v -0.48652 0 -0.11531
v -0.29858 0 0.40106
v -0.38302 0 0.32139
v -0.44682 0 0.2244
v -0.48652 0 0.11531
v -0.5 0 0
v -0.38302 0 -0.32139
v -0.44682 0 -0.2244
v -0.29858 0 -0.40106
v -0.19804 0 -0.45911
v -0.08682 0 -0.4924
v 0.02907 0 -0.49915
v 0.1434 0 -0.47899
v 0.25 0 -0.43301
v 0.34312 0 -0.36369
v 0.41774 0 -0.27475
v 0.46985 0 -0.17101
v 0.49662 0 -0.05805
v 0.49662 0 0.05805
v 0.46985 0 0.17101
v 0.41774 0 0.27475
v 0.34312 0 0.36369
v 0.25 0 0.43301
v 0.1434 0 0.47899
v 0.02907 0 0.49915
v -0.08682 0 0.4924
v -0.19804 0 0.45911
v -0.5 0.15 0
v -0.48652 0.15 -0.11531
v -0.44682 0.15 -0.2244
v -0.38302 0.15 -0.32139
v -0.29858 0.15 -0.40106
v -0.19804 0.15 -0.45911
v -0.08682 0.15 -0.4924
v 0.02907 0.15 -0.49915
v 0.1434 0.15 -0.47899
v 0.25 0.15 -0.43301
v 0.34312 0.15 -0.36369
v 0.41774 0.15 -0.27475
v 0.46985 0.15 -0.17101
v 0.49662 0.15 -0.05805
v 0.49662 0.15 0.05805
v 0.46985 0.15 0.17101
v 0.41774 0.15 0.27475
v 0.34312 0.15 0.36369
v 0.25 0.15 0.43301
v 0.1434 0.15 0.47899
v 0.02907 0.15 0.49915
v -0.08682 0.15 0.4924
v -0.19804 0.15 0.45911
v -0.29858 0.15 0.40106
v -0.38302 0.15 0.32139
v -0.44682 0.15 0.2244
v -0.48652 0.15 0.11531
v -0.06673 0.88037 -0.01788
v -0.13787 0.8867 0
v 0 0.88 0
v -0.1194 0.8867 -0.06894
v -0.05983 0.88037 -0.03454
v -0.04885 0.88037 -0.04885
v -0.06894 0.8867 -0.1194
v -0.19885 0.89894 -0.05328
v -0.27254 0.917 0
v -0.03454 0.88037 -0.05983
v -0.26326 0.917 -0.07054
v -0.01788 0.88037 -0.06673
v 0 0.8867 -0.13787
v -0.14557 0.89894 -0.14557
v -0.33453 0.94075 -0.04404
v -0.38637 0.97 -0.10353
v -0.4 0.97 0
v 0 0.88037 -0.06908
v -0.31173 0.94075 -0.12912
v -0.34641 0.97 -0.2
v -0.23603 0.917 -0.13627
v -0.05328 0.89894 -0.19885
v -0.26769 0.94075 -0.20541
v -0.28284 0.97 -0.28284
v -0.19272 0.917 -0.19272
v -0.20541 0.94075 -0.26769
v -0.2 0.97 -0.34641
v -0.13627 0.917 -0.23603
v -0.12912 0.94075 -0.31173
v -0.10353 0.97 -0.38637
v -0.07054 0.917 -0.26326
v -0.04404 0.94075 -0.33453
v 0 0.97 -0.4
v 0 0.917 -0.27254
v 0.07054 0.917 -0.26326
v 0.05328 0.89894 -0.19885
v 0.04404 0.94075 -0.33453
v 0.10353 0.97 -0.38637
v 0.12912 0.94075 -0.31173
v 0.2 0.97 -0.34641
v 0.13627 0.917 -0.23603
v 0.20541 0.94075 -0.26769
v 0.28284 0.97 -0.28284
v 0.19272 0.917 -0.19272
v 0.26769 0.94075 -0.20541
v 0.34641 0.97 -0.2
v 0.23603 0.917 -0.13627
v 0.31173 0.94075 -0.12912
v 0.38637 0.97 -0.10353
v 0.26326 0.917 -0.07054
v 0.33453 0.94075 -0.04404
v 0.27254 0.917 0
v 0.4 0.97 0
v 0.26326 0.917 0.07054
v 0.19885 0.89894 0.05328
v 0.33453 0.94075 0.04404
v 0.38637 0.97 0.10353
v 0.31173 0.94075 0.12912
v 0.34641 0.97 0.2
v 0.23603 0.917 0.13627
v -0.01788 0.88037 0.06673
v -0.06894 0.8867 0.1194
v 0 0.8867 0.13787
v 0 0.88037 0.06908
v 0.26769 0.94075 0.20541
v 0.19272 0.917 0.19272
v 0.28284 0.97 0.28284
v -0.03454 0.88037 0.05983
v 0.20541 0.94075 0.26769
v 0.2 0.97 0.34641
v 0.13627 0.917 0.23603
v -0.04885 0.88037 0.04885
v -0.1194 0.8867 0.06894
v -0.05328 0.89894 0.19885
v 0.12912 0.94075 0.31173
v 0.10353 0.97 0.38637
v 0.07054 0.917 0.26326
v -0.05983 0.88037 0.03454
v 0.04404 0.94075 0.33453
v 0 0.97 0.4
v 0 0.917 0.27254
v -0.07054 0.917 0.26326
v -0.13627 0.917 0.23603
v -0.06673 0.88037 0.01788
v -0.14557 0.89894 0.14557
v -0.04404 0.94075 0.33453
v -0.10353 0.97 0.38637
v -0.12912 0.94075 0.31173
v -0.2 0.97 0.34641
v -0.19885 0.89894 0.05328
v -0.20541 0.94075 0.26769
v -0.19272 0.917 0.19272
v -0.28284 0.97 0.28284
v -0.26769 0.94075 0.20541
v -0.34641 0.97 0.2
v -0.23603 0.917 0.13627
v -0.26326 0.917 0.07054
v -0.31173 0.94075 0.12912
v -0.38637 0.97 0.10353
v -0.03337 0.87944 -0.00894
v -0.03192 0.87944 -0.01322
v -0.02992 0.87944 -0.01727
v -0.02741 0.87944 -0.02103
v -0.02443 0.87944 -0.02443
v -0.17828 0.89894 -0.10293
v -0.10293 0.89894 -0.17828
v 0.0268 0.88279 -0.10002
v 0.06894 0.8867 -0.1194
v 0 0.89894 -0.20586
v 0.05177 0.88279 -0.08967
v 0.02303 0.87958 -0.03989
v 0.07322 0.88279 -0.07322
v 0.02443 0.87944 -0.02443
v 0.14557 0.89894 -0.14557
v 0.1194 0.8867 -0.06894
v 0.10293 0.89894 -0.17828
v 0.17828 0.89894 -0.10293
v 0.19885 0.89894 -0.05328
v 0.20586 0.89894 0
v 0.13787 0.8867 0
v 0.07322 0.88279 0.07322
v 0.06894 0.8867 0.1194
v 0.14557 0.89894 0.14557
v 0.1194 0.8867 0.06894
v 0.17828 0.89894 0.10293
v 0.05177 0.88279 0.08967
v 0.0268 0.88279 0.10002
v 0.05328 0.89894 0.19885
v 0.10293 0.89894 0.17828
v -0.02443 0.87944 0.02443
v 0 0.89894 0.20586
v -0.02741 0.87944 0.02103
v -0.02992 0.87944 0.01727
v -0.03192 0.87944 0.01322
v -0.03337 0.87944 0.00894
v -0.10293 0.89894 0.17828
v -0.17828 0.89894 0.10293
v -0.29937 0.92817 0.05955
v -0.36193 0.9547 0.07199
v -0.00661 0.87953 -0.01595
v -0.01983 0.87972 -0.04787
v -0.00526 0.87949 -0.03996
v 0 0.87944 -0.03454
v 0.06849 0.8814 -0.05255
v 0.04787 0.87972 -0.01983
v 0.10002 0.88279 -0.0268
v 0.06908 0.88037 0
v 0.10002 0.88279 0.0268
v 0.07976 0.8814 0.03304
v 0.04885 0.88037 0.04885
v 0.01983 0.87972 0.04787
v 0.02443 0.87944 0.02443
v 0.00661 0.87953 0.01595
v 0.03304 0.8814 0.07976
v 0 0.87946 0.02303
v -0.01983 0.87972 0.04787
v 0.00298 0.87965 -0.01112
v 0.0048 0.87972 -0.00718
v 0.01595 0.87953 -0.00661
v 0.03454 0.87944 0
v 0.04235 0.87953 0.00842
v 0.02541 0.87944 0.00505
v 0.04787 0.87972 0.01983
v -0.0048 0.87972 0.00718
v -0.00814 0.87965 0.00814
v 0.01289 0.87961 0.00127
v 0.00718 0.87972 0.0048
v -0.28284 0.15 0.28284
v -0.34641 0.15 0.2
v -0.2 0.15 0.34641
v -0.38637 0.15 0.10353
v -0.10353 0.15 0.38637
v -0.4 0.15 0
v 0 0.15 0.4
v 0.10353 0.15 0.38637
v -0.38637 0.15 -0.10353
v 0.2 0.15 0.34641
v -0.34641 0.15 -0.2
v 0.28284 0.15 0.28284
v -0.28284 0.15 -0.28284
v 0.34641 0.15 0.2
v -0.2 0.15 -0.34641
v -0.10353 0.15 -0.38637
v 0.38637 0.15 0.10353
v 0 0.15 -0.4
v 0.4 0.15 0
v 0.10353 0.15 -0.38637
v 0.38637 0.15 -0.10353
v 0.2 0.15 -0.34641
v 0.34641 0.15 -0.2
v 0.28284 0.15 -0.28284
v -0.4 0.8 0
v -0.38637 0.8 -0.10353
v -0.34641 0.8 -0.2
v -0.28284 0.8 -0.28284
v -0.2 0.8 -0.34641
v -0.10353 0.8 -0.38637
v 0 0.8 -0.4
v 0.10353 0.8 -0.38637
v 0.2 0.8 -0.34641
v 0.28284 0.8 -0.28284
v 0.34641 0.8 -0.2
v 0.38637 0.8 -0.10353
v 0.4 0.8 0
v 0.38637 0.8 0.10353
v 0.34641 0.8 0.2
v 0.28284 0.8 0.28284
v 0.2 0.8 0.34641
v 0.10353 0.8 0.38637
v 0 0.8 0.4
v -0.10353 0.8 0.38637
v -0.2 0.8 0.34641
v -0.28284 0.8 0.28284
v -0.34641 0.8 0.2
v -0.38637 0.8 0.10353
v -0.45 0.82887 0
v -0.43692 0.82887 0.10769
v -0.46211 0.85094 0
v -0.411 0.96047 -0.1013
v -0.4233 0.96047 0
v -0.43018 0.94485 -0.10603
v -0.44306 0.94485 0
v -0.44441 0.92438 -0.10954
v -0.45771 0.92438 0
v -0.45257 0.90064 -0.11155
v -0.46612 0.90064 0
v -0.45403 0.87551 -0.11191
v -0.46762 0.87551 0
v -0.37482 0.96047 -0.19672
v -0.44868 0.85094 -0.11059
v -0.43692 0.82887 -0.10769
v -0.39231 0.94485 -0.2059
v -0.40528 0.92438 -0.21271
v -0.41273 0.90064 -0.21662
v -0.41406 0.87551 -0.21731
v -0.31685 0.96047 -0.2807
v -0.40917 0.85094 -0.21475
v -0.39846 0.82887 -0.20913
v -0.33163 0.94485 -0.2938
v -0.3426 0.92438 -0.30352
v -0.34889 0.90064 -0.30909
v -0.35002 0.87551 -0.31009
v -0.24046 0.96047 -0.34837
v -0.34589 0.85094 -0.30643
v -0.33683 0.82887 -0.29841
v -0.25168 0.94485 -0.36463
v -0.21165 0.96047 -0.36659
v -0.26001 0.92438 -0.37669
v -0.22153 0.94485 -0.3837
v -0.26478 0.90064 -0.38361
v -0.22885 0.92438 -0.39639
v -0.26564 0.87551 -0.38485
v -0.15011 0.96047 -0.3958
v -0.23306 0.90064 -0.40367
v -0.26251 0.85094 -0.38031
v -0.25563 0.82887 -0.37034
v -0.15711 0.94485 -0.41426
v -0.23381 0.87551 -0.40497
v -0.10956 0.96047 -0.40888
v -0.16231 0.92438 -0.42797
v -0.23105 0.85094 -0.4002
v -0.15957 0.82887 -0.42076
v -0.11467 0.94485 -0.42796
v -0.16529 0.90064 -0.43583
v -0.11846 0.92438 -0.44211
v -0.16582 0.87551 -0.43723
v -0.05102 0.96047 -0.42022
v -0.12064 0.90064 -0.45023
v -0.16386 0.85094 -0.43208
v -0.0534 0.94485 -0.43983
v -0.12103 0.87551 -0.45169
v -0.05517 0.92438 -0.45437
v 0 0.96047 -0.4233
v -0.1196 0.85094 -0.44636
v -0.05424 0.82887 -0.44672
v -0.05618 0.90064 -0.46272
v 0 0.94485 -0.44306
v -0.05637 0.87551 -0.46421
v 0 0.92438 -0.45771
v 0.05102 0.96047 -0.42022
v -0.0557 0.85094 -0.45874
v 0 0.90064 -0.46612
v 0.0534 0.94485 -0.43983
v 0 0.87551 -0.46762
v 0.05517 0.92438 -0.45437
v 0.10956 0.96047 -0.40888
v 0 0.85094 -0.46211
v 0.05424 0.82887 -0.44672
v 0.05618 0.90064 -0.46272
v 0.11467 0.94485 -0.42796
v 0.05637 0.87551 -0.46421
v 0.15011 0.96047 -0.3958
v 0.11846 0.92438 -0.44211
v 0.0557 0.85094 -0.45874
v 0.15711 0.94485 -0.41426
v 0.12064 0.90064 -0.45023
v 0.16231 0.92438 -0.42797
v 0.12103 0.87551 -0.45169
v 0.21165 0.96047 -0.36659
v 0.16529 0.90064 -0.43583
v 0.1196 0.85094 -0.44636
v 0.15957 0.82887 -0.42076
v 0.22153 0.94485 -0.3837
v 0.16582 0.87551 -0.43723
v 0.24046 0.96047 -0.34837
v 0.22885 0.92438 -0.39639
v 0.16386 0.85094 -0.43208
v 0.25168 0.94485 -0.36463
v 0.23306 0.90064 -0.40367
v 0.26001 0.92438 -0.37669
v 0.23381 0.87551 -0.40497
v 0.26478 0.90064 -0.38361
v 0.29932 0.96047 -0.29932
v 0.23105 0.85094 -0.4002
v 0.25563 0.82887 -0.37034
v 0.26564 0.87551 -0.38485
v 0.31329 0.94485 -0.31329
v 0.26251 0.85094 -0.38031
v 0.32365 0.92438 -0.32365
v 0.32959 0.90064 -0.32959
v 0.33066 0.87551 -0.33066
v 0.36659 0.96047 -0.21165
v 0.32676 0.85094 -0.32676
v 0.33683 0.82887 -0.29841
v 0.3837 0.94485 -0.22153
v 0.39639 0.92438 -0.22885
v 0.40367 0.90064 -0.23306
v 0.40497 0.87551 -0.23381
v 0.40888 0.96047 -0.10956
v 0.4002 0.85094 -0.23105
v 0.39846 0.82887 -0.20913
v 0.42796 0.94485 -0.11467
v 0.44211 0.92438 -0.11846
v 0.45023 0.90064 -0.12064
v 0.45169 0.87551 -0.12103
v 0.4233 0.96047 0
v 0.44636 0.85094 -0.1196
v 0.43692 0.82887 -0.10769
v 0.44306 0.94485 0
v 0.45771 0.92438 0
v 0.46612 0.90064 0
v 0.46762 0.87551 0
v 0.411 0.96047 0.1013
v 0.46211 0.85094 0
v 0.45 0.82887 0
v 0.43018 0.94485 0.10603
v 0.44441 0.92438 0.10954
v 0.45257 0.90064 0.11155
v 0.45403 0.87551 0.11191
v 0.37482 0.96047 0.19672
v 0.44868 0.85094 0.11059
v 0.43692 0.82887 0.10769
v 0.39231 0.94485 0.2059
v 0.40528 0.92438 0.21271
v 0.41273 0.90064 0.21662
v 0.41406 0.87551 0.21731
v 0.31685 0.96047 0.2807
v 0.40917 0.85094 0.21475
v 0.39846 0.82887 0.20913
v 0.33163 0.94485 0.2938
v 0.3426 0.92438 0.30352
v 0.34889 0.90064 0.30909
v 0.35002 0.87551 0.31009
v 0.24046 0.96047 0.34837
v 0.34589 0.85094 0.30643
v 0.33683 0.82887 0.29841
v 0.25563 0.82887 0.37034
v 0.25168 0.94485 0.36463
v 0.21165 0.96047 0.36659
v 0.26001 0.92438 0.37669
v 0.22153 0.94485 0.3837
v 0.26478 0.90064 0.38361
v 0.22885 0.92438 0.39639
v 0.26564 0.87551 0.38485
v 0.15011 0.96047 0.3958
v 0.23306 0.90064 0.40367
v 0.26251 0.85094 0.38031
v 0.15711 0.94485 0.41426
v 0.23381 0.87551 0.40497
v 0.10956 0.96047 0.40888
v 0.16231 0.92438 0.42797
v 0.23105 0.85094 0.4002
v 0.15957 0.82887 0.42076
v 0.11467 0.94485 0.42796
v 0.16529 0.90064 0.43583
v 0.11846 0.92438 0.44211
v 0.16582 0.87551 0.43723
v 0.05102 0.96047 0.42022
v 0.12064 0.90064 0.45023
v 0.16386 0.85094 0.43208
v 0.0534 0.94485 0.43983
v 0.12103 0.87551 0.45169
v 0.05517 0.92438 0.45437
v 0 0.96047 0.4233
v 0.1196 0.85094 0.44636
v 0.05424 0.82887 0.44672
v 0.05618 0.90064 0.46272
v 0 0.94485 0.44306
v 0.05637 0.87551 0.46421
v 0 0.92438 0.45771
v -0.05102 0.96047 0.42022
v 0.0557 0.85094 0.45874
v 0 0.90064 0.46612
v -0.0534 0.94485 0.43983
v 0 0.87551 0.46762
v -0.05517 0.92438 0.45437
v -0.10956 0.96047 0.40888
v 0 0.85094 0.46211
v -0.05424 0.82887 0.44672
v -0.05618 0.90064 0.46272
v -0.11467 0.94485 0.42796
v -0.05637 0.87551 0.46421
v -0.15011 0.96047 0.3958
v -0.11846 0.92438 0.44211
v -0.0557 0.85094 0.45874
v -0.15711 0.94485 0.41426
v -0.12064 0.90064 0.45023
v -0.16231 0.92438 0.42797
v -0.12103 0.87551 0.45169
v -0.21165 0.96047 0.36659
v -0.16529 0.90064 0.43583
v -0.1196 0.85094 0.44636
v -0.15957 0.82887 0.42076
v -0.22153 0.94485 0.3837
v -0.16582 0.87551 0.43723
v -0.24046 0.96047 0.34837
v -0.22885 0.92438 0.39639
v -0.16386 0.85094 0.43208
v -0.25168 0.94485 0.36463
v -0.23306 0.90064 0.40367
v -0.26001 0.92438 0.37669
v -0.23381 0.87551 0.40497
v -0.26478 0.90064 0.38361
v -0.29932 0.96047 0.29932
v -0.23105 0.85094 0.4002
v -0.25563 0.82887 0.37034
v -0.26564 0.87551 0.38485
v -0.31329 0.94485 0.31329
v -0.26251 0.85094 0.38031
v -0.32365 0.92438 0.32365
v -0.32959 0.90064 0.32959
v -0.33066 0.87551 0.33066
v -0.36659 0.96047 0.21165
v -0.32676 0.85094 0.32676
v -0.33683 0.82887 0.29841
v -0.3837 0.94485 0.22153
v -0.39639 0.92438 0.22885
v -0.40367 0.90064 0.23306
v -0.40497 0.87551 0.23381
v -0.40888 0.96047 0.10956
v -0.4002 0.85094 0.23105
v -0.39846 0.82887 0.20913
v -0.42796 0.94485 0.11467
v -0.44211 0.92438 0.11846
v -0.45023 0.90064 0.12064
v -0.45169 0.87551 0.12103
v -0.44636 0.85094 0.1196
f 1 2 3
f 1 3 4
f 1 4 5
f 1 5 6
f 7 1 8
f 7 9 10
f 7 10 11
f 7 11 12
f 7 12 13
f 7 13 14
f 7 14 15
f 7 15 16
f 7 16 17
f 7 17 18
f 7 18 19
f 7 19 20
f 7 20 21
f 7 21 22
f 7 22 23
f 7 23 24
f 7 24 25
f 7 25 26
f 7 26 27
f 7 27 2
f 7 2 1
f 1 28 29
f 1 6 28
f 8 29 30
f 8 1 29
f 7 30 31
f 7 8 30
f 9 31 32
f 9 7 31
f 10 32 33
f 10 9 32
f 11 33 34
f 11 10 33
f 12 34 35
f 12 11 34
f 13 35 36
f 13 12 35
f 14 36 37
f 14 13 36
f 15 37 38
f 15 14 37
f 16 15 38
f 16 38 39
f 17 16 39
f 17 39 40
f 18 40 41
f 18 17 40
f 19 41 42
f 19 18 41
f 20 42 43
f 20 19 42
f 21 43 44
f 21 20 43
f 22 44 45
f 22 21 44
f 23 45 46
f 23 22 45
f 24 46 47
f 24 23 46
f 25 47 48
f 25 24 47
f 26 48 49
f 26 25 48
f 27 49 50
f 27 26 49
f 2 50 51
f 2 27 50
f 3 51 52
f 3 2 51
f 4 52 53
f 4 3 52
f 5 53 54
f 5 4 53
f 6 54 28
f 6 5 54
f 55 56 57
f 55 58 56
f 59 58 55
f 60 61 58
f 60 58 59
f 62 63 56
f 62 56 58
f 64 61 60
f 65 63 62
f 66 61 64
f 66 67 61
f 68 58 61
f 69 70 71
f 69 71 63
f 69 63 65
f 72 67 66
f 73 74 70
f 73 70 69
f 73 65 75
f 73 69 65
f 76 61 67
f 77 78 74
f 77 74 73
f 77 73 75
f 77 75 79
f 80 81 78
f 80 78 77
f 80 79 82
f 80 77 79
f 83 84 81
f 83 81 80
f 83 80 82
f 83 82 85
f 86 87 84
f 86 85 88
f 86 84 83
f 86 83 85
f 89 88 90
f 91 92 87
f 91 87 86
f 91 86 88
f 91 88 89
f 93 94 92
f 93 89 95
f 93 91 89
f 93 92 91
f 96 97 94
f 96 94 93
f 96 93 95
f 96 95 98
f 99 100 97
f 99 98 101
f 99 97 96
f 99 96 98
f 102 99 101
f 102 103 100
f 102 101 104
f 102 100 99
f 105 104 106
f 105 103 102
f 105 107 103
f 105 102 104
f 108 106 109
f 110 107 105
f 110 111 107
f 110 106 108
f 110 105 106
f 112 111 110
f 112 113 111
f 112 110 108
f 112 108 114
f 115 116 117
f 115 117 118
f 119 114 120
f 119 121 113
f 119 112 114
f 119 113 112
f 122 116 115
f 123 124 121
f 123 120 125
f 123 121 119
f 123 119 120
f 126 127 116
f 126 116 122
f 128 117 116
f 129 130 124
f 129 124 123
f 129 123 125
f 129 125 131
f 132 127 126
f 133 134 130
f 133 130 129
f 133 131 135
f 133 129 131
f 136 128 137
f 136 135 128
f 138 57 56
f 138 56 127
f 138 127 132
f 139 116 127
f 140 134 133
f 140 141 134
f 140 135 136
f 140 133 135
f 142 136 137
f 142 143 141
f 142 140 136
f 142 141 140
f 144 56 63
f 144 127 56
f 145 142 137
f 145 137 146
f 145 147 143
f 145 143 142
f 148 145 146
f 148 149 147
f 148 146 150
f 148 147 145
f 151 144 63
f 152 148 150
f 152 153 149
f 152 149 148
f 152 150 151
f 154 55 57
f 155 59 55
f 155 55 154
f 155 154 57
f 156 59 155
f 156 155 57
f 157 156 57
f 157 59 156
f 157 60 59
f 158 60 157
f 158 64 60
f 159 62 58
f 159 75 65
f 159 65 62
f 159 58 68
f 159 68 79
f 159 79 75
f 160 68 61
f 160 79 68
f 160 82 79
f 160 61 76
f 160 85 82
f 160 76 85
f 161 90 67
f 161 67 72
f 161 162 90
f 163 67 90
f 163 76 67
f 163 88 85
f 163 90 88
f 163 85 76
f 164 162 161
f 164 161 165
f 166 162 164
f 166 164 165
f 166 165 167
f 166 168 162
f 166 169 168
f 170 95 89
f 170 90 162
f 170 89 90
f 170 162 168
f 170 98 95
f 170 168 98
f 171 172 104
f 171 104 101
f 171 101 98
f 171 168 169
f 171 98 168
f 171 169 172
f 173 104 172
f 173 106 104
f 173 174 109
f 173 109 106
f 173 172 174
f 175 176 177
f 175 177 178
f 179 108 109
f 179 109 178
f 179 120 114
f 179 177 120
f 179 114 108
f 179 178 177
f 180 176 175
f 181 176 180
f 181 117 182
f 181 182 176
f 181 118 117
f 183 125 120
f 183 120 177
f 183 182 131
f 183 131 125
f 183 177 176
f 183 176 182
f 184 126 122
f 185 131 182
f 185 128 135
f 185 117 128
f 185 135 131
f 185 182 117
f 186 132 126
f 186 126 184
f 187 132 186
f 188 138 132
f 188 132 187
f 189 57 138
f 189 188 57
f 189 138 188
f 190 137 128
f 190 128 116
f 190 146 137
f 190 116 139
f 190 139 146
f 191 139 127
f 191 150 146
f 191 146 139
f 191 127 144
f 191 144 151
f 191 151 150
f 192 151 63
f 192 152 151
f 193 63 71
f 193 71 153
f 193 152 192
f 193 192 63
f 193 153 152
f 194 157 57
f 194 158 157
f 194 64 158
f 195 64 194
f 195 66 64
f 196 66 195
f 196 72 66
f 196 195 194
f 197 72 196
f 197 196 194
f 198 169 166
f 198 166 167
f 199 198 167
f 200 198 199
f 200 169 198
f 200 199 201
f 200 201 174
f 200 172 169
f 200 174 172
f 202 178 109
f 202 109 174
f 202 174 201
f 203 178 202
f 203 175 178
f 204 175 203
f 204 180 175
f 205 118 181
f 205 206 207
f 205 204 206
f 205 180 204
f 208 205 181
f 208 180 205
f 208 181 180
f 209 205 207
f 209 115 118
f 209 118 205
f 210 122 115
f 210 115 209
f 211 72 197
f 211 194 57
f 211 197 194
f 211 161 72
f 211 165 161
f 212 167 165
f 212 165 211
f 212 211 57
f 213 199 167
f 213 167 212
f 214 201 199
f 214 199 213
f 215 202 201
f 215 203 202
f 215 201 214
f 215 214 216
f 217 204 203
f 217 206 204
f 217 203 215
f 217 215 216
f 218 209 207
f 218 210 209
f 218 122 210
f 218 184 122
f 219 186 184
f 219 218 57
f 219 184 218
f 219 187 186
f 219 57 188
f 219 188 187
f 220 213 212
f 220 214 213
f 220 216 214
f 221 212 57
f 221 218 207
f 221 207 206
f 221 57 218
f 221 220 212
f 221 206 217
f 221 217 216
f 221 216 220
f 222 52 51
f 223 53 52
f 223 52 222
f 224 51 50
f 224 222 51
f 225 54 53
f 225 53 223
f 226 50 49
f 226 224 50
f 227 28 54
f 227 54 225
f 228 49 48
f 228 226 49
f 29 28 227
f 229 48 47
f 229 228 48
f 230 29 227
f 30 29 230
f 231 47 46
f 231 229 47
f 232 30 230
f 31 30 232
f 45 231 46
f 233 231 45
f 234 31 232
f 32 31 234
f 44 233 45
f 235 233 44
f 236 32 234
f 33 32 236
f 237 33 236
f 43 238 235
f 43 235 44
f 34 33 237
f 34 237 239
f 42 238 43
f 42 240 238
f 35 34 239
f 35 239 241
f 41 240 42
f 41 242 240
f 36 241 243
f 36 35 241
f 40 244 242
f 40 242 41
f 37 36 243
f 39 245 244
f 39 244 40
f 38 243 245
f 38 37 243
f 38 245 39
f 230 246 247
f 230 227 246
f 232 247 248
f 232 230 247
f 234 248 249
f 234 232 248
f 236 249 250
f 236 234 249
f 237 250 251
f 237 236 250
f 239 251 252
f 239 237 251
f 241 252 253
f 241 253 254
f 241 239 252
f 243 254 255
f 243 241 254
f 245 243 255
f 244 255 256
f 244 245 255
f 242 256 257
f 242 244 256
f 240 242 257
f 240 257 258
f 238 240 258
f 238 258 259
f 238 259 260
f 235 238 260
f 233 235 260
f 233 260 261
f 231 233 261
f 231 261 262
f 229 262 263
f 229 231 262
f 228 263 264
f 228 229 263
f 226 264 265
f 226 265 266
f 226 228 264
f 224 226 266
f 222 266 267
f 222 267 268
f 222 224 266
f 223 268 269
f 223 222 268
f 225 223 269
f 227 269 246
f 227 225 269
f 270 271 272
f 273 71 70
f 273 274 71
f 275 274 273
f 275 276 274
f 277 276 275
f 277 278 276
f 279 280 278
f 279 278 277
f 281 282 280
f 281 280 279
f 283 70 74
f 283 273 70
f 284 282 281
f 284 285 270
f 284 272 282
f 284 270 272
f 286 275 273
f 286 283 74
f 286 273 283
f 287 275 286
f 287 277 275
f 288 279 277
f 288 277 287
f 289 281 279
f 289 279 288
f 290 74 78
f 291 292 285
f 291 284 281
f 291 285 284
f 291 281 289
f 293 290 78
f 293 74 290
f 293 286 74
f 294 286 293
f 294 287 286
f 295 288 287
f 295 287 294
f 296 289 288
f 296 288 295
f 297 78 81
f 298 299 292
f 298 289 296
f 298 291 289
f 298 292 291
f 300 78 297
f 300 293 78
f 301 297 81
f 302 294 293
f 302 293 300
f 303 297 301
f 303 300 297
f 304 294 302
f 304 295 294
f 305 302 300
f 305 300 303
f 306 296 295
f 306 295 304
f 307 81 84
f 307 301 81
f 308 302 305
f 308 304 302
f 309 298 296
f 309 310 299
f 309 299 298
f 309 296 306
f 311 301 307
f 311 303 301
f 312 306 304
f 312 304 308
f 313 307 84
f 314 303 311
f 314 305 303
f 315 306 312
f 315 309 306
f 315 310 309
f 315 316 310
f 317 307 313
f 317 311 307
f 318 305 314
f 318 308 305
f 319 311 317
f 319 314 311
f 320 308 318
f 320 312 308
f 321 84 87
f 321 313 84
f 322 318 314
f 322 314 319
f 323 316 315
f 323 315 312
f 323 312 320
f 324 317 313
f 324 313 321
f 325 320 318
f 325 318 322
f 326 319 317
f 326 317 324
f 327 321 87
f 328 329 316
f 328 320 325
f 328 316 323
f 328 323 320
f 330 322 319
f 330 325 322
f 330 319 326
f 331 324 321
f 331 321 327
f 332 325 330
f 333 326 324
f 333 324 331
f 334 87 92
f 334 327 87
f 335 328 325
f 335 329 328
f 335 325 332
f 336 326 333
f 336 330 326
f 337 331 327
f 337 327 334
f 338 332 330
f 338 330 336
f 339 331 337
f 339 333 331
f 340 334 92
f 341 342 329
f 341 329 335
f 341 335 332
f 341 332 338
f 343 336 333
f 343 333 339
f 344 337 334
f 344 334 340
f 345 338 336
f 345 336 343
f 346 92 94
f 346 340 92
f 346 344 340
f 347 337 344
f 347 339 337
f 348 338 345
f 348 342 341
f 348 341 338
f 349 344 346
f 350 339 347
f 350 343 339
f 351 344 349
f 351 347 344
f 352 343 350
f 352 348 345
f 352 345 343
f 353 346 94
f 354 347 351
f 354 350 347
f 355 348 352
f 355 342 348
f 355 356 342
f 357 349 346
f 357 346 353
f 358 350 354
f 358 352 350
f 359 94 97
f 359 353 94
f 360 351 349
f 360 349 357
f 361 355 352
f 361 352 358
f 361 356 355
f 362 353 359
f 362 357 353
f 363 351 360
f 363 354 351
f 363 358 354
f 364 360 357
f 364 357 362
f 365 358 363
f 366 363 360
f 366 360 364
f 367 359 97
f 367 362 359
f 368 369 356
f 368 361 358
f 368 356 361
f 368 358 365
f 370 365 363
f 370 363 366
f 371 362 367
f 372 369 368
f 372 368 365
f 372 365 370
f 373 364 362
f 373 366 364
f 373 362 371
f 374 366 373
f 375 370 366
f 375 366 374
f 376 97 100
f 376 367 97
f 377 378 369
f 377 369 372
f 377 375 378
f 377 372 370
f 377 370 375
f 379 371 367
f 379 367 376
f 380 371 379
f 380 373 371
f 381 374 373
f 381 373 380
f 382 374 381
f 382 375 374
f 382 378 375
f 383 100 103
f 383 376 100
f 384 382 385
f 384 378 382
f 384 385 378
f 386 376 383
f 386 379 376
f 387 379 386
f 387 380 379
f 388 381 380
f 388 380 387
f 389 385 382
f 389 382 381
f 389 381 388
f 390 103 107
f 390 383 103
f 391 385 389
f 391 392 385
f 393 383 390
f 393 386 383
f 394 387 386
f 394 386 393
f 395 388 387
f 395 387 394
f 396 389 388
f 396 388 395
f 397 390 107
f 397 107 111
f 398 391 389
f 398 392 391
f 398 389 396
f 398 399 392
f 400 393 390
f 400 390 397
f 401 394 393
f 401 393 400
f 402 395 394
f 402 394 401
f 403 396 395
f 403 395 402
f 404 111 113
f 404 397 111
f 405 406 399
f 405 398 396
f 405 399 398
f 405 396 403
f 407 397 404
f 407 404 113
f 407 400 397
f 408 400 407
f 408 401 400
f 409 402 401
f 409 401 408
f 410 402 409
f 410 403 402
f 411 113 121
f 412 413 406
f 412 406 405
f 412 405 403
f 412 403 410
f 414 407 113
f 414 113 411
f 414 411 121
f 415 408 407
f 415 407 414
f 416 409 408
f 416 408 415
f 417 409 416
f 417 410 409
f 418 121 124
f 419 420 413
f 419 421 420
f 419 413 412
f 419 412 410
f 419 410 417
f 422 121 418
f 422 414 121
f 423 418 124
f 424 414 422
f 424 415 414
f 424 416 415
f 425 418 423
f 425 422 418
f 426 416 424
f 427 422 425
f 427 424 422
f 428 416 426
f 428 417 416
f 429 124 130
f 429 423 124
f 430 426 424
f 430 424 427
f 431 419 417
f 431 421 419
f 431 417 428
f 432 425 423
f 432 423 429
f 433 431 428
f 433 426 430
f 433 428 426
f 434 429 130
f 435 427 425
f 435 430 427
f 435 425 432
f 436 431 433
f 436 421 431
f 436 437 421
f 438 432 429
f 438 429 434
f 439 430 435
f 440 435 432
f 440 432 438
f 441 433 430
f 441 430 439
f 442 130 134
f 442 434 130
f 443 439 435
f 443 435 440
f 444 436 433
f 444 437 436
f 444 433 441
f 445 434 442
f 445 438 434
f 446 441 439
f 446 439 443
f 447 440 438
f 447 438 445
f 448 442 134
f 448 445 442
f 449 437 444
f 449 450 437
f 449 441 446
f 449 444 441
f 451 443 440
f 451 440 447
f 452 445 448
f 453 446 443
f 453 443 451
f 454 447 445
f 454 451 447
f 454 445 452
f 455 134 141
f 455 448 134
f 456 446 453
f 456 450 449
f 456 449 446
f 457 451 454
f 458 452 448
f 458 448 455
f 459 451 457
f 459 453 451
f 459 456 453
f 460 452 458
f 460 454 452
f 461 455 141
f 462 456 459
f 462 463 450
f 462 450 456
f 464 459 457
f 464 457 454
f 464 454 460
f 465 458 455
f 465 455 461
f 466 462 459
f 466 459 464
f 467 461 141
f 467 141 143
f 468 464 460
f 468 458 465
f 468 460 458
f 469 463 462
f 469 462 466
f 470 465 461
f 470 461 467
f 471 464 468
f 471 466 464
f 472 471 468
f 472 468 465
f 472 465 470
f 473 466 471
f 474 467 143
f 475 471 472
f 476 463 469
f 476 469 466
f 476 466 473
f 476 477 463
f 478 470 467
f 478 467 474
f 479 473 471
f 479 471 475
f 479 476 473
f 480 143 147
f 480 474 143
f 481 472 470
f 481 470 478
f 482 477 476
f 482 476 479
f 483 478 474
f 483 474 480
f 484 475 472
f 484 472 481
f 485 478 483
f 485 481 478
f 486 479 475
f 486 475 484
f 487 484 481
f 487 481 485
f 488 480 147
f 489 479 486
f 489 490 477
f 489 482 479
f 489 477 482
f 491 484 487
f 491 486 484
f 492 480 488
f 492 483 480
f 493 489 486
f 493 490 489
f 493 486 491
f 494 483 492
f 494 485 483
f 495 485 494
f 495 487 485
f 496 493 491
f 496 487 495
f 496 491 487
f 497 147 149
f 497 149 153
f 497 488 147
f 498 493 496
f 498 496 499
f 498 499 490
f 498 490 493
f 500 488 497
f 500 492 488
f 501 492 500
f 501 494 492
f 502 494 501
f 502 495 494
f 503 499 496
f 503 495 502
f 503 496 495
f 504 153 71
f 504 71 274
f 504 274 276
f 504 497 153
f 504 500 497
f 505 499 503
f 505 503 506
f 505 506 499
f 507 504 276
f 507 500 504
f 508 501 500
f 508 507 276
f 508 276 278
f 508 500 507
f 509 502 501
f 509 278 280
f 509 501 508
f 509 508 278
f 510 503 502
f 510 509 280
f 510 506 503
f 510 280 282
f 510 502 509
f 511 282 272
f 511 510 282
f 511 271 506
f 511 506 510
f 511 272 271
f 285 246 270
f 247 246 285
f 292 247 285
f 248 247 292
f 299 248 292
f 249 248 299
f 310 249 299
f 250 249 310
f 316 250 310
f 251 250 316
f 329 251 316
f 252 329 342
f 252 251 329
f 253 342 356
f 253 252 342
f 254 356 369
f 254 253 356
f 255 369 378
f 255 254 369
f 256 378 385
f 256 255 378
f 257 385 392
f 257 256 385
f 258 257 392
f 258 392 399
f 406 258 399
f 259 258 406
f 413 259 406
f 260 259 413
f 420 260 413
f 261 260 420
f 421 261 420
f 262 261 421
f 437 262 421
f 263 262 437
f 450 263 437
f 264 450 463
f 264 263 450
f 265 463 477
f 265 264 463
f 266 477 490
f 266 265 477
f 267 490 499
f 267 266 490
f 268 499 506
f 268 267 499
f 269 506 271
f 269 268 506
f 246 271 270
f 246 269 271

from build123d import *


with BuildPart() as part:
    # Sketch1 → Revolve1 (revolve)
    with BuildSketch(Plane.XY, mode=Mode.PRIVATE) as revolve1_sk:
        with BuildLine():
            Line((0, 0), (0, 0.8))
            Line((0, 0.8), (0, 0.88))
            ThreePointArc((0, 0.88), (0.205863515, 0.898939934), (0.4, 0.97))
            ThreePointArc((0.4, 0.97), (0.462747108, 0.912806691), (0.45, 0.828867513))
            Line((0.45, 0.828867513), (0.4, 0.8))
            Line((0.4, 0.8), (0.4, 0.15))
            Line((0.4, 0.15), (0.5, 0.15))
            Line((0.5, 0.15), (0.5, 0))
            Line((0.5, 0), (0, 0))
        make_face()
    revolve(revolve1_sk.sketch.rotate(Axis((0, 0.88, 0), (0, -1, 0)), 180), axis=Axis((0, 0.88, 0), (0, -1, 0)))


solid = part.part
